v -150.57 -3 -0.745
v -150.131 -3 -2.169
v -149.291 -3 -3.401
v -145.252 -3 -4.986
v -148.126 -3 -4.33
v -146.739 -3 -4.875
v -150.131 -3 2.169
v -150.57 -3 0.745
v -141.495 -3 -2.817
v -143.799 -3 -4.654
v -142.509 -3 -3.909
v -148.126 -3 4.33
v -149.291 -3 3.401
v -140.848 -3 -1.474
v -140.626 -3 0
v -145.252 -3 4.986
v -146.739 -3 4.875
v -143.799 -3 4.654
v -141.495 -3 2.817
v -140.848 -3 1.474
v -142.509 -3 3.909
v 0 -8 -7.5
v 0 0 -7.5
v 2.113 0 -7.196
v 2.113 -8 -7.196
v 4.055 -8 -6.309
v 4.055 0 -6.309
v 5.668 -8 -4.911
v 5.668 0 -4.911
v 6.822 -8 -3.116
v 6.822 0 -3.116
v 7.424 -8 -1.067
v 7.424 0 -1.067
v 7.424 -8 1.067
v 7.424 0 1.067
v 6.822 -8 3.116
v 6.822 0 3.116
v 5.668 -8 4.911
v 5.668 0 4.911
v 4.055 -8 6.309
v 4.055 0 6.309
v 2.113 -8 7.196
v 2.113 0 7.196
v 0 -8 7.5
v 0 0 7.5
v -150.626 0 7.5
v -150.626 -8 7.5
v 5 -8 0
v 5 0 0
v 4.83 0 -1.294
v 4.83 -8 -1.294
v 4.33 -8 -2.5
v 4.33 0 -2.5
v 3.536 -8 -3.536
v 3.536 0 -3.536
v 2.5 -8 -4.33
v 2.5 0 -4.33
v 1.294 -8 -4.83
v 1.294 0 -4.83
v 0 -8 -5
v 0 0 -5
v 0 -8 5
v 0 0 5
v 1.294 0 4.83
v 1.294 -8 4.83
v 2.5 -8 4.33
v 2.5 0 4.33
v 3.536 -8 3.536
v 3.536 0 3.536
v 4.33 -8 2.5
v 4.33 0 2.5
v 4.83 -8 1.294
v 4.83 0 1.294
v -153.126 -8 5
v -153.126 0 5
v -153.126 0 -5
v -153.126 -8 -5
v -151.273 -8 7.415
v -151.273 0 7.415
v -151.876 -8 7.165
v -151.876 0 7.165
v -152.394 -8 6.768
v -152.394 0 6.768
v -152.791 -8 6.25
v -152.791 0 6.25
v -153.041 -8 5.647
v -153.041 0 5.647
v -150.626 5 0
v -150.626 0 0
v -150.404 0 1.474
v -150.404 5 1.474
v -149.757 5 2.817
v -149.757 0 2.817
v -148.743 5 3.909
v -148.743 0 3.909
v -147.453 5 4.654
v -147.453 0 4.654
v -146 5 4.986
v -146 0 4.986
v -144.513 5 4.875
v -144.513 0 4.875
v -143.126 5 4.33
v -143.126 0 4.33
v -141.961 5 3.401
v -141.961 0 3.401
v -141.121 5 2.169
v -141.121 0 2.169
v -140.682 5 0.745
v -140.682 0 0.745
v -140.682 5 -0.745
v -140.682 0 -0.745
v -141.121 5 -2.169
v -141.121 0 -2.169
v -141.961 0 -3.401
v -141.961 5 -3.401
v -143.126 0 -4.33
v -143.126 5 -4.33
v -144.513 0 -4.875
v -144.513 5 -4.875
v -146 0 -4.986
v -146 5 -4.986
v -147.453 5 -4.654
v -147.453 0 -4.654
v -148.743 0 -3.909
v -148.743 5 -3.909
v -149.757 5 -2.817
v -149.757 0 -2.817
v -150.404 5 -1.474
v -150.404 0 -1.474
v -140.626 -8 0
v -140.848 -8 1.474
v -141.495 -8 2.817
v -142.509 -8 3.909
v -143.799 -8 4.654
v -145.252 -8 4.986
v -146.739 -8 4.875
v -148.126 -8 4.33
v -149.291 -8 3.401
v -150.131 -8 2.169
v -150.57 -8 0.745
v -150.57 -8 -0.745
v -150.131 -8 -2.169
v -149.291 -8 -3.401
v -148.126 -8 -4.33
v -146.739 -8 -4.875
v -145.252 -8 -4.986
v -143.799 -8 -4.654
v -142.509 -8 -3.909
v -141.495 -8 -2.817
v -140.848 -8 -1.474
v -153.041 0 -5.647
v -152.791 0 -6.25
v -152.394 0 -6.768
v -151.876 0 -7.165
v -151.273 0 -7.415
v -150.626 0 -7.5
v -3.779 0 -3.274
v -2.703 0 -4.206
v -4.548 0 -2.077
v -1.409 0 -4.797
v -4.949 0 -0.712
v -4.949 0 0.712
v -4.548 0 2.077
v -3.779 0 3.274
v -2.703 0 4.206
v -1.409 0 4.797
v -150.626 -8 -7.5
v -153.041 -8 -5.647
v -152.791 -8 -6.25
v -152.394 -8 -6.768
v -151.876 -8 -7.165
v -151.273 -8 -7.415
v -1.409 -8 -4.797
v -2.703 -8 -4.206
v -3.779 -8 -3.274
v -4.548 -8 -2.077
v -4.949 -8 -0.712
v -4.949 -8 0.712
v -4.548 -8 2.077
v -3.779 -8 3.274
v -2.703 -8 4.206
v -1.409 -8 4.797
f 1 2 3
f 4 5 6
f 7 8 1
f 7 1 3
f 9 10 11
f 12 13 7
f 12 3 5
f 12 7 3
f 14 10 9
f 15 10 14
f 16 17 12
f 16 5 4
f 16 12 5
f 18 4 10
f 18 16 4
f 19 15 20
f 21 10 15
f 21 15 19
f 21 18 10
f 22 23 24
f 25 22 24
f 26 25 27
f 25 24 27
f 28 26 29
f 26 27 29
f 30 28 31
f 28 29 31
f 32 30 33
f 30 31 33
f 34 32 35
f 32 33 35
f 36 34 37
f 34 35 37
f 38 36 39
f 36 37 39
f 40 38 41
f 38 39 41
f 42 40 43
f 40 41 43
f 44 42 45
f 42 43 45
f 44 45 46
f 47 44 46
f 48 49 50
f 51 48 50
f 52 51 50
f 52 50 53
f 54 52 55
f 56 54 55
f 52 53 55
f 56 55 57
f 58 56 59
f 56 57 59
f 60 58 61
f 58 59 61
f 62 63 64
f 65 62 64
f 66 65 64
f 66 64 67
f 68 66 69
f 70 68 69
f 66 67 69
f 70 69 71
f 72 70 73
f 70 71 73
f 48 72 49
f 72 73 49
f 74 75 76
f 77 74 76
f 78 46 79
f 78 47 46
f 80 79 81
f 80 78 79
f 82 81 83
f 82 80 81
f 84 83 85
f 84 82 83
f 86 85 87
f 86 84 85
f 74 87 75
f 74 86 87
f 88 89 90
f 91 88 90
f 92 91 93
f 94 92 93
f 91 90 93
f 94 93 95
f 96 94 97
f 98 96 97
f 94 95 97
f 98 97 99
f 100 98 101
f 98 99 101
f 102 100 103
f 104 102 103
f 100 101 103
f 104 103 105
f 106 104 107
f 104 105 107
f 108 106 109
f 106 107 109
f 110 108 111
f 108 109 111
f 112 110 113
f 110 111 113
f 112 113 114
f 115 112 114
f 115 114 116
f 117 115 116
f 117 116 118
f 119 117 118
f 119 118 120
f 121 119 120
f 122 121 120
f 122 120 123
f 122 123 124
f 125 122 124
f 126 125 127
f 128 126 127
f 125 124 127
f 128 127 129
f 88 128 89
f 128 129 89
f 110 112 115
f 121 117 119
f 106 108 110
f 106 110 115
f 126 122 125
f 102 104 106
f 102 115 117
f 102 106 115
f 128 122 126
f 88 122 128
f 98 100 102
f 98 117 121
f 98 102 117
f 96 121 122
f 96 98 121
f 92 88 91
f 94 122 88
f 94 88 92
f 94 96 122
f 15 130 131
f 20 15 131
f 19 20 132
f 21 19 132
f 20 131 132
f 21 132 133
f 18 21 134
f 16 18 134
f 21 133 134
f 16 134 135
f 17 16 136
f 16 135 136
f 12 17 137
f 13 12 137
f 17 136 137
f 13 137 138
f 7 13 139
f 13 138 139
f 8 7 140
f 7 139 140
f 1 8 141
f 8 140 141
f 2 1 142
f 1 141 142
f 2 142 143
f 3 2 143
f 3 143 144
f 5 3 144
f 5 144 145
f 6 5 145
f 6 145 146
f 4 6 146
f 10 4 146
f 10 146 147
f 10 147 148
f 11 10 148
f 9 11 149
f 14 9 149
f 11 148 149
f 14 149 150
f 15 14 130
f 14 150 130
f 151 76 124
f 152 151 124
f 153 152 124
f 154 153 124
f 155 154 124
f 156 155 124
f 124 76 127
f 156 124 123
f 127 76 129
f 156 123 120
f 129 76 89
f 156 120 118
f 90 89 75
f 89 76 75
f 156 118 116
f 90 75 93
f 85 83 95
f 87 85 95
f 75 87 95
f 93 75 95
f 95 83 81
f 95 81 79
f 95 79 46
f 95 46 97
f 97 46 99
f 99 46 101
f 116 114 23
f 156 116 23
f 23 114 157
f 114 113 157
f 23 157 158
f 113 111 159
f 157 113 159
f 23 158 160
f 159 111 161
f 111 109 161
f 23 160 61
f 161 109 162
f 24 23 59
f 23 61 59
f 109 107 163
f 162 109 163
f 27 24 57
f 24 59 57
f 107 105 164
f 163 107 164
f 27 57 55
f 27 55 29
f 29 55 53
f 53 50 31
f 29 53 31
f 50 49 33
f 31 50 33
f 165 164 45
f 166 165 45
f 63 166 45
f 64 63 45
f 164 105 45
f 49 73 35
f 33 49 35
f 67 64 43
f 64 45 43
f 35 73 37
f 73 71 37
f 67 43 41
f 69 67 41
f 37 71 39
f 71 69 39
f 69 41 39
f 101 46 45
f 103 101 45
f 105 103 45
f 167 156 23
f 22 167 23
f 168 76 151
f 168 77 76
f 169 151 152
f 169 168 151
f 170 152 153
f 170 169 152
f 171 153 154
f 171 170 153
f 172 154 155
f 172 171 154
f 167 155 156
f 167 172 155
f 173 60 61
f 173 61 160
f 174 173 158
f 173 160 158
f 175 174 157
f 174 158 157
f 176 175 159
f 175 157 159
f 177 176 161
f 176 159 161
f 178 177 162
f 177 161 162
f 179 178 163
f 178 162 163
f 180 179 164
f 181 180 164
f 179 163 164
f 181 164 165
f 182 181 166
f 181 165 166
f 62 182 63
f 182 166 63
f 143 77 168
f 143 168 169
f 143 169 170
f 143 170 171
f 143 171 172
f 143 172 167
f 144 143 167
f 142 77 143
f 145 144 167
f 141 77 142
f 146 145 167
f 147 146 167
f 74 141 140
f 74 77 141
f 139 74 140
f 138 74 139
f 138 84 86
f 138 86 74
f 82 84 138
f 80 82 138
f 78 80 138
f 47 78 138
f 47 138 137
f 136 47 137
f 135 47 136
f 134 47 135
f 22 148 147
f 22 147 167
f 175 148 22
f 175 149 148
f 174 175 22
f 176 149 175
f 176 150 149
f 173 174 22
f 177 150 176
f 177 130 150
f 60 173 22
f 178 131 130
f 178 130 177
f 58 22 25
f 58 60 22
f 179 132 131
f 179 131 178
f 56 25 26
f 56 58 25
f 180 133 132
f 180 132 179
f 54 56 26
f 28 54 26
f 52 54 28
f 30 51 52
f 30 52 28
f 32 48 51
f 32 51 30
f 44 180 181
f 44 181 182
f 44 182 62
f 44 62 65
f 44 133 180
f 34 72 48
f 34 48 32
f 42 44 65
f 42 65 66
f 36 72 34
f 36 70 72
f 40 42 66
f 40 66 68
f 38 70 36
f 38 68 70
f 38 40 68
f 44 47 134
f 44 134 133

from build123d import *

# Parameters (mm, degrees)
F1_DEPTH = 8
F2_R     = 2.5
F3_R     = 5
F4_DEPTH = 5
F5_R     = 5
F6_DEPTH = 5


# Not quite as in the source:
# - a feature names something its author has since deleted; it is built from what else it names


with BuildPart() as f1:
    # F0 (on Front) → F1 (new body)
    with BuildSketch(Plane.XZ):
        with BuildLine():
            ThreePointArc((0, -7.5), (-7.5, 0), (0, 7.5))
            Line((0, 7.5), (-153.126, 7.5))
            Line((-153.126, 7.5), (-153.126, -7.5))
            Line((-153.126, -7.5), (0, -7.5))
        make_face()
        with BuildLine():
            Line((0, 5), (0, 7.5))
            ThreePointArc((0, 7.5), (-7.5, 0), (0, -7.5))
            Line((0, -7.5), (0, -5))
            ThreePointArc((0, -5), (-5, 0), (0, 5))
        make_face()
        with BuildLine():
            ThreePointArc((0, -7.5), (5.3033008589, -5.3033008589), (7.5, 0))
            ThreePointArc((7.5, 0), (5.3033008589, 5.3033008589), (0, 7.5))
            Line((0, 7.5), (0, 5))
            ThreePointArc((0, 5), (3.5355339059, 3.5355339059), (5, 0))
            ThreePointArc((5, 0), (3.5355339059, -3.5355339059), (0, -5))
            Line((0, -5), (0, -7.5))
        make_face()
    extrude(amount=F1_DEPTH)

    # F2
    f2_edges = [f1.edges().sort_by_distance(p)[0] for p in [
        (-153.126, -4, 7.5),
        (-153.126, -4, -7.5),
    ]]
    fillet(f2_edges, radius=F2_R)

    # F3 (on face) → F4 (join)
    with BuildSketch(Plane(origin=(0, 0, 0), x_dir=(-1, 0, 0), z_dir=(0, 1, 0))):
        with Locations((145.626, 0)):
            Circle(F3_R)
    extrude(amount=F4_DEPTH)

    # F5 (on face) → F6 (cut)
    with BuildSketch(Plane.XZ.offset(8)):
        with Locations((-145.626, 0)):
            Circle(F5_R)
    extrude(amount=-F6_DEPTH, mode=Mode.SUBTRACT)


solid = f1.part
